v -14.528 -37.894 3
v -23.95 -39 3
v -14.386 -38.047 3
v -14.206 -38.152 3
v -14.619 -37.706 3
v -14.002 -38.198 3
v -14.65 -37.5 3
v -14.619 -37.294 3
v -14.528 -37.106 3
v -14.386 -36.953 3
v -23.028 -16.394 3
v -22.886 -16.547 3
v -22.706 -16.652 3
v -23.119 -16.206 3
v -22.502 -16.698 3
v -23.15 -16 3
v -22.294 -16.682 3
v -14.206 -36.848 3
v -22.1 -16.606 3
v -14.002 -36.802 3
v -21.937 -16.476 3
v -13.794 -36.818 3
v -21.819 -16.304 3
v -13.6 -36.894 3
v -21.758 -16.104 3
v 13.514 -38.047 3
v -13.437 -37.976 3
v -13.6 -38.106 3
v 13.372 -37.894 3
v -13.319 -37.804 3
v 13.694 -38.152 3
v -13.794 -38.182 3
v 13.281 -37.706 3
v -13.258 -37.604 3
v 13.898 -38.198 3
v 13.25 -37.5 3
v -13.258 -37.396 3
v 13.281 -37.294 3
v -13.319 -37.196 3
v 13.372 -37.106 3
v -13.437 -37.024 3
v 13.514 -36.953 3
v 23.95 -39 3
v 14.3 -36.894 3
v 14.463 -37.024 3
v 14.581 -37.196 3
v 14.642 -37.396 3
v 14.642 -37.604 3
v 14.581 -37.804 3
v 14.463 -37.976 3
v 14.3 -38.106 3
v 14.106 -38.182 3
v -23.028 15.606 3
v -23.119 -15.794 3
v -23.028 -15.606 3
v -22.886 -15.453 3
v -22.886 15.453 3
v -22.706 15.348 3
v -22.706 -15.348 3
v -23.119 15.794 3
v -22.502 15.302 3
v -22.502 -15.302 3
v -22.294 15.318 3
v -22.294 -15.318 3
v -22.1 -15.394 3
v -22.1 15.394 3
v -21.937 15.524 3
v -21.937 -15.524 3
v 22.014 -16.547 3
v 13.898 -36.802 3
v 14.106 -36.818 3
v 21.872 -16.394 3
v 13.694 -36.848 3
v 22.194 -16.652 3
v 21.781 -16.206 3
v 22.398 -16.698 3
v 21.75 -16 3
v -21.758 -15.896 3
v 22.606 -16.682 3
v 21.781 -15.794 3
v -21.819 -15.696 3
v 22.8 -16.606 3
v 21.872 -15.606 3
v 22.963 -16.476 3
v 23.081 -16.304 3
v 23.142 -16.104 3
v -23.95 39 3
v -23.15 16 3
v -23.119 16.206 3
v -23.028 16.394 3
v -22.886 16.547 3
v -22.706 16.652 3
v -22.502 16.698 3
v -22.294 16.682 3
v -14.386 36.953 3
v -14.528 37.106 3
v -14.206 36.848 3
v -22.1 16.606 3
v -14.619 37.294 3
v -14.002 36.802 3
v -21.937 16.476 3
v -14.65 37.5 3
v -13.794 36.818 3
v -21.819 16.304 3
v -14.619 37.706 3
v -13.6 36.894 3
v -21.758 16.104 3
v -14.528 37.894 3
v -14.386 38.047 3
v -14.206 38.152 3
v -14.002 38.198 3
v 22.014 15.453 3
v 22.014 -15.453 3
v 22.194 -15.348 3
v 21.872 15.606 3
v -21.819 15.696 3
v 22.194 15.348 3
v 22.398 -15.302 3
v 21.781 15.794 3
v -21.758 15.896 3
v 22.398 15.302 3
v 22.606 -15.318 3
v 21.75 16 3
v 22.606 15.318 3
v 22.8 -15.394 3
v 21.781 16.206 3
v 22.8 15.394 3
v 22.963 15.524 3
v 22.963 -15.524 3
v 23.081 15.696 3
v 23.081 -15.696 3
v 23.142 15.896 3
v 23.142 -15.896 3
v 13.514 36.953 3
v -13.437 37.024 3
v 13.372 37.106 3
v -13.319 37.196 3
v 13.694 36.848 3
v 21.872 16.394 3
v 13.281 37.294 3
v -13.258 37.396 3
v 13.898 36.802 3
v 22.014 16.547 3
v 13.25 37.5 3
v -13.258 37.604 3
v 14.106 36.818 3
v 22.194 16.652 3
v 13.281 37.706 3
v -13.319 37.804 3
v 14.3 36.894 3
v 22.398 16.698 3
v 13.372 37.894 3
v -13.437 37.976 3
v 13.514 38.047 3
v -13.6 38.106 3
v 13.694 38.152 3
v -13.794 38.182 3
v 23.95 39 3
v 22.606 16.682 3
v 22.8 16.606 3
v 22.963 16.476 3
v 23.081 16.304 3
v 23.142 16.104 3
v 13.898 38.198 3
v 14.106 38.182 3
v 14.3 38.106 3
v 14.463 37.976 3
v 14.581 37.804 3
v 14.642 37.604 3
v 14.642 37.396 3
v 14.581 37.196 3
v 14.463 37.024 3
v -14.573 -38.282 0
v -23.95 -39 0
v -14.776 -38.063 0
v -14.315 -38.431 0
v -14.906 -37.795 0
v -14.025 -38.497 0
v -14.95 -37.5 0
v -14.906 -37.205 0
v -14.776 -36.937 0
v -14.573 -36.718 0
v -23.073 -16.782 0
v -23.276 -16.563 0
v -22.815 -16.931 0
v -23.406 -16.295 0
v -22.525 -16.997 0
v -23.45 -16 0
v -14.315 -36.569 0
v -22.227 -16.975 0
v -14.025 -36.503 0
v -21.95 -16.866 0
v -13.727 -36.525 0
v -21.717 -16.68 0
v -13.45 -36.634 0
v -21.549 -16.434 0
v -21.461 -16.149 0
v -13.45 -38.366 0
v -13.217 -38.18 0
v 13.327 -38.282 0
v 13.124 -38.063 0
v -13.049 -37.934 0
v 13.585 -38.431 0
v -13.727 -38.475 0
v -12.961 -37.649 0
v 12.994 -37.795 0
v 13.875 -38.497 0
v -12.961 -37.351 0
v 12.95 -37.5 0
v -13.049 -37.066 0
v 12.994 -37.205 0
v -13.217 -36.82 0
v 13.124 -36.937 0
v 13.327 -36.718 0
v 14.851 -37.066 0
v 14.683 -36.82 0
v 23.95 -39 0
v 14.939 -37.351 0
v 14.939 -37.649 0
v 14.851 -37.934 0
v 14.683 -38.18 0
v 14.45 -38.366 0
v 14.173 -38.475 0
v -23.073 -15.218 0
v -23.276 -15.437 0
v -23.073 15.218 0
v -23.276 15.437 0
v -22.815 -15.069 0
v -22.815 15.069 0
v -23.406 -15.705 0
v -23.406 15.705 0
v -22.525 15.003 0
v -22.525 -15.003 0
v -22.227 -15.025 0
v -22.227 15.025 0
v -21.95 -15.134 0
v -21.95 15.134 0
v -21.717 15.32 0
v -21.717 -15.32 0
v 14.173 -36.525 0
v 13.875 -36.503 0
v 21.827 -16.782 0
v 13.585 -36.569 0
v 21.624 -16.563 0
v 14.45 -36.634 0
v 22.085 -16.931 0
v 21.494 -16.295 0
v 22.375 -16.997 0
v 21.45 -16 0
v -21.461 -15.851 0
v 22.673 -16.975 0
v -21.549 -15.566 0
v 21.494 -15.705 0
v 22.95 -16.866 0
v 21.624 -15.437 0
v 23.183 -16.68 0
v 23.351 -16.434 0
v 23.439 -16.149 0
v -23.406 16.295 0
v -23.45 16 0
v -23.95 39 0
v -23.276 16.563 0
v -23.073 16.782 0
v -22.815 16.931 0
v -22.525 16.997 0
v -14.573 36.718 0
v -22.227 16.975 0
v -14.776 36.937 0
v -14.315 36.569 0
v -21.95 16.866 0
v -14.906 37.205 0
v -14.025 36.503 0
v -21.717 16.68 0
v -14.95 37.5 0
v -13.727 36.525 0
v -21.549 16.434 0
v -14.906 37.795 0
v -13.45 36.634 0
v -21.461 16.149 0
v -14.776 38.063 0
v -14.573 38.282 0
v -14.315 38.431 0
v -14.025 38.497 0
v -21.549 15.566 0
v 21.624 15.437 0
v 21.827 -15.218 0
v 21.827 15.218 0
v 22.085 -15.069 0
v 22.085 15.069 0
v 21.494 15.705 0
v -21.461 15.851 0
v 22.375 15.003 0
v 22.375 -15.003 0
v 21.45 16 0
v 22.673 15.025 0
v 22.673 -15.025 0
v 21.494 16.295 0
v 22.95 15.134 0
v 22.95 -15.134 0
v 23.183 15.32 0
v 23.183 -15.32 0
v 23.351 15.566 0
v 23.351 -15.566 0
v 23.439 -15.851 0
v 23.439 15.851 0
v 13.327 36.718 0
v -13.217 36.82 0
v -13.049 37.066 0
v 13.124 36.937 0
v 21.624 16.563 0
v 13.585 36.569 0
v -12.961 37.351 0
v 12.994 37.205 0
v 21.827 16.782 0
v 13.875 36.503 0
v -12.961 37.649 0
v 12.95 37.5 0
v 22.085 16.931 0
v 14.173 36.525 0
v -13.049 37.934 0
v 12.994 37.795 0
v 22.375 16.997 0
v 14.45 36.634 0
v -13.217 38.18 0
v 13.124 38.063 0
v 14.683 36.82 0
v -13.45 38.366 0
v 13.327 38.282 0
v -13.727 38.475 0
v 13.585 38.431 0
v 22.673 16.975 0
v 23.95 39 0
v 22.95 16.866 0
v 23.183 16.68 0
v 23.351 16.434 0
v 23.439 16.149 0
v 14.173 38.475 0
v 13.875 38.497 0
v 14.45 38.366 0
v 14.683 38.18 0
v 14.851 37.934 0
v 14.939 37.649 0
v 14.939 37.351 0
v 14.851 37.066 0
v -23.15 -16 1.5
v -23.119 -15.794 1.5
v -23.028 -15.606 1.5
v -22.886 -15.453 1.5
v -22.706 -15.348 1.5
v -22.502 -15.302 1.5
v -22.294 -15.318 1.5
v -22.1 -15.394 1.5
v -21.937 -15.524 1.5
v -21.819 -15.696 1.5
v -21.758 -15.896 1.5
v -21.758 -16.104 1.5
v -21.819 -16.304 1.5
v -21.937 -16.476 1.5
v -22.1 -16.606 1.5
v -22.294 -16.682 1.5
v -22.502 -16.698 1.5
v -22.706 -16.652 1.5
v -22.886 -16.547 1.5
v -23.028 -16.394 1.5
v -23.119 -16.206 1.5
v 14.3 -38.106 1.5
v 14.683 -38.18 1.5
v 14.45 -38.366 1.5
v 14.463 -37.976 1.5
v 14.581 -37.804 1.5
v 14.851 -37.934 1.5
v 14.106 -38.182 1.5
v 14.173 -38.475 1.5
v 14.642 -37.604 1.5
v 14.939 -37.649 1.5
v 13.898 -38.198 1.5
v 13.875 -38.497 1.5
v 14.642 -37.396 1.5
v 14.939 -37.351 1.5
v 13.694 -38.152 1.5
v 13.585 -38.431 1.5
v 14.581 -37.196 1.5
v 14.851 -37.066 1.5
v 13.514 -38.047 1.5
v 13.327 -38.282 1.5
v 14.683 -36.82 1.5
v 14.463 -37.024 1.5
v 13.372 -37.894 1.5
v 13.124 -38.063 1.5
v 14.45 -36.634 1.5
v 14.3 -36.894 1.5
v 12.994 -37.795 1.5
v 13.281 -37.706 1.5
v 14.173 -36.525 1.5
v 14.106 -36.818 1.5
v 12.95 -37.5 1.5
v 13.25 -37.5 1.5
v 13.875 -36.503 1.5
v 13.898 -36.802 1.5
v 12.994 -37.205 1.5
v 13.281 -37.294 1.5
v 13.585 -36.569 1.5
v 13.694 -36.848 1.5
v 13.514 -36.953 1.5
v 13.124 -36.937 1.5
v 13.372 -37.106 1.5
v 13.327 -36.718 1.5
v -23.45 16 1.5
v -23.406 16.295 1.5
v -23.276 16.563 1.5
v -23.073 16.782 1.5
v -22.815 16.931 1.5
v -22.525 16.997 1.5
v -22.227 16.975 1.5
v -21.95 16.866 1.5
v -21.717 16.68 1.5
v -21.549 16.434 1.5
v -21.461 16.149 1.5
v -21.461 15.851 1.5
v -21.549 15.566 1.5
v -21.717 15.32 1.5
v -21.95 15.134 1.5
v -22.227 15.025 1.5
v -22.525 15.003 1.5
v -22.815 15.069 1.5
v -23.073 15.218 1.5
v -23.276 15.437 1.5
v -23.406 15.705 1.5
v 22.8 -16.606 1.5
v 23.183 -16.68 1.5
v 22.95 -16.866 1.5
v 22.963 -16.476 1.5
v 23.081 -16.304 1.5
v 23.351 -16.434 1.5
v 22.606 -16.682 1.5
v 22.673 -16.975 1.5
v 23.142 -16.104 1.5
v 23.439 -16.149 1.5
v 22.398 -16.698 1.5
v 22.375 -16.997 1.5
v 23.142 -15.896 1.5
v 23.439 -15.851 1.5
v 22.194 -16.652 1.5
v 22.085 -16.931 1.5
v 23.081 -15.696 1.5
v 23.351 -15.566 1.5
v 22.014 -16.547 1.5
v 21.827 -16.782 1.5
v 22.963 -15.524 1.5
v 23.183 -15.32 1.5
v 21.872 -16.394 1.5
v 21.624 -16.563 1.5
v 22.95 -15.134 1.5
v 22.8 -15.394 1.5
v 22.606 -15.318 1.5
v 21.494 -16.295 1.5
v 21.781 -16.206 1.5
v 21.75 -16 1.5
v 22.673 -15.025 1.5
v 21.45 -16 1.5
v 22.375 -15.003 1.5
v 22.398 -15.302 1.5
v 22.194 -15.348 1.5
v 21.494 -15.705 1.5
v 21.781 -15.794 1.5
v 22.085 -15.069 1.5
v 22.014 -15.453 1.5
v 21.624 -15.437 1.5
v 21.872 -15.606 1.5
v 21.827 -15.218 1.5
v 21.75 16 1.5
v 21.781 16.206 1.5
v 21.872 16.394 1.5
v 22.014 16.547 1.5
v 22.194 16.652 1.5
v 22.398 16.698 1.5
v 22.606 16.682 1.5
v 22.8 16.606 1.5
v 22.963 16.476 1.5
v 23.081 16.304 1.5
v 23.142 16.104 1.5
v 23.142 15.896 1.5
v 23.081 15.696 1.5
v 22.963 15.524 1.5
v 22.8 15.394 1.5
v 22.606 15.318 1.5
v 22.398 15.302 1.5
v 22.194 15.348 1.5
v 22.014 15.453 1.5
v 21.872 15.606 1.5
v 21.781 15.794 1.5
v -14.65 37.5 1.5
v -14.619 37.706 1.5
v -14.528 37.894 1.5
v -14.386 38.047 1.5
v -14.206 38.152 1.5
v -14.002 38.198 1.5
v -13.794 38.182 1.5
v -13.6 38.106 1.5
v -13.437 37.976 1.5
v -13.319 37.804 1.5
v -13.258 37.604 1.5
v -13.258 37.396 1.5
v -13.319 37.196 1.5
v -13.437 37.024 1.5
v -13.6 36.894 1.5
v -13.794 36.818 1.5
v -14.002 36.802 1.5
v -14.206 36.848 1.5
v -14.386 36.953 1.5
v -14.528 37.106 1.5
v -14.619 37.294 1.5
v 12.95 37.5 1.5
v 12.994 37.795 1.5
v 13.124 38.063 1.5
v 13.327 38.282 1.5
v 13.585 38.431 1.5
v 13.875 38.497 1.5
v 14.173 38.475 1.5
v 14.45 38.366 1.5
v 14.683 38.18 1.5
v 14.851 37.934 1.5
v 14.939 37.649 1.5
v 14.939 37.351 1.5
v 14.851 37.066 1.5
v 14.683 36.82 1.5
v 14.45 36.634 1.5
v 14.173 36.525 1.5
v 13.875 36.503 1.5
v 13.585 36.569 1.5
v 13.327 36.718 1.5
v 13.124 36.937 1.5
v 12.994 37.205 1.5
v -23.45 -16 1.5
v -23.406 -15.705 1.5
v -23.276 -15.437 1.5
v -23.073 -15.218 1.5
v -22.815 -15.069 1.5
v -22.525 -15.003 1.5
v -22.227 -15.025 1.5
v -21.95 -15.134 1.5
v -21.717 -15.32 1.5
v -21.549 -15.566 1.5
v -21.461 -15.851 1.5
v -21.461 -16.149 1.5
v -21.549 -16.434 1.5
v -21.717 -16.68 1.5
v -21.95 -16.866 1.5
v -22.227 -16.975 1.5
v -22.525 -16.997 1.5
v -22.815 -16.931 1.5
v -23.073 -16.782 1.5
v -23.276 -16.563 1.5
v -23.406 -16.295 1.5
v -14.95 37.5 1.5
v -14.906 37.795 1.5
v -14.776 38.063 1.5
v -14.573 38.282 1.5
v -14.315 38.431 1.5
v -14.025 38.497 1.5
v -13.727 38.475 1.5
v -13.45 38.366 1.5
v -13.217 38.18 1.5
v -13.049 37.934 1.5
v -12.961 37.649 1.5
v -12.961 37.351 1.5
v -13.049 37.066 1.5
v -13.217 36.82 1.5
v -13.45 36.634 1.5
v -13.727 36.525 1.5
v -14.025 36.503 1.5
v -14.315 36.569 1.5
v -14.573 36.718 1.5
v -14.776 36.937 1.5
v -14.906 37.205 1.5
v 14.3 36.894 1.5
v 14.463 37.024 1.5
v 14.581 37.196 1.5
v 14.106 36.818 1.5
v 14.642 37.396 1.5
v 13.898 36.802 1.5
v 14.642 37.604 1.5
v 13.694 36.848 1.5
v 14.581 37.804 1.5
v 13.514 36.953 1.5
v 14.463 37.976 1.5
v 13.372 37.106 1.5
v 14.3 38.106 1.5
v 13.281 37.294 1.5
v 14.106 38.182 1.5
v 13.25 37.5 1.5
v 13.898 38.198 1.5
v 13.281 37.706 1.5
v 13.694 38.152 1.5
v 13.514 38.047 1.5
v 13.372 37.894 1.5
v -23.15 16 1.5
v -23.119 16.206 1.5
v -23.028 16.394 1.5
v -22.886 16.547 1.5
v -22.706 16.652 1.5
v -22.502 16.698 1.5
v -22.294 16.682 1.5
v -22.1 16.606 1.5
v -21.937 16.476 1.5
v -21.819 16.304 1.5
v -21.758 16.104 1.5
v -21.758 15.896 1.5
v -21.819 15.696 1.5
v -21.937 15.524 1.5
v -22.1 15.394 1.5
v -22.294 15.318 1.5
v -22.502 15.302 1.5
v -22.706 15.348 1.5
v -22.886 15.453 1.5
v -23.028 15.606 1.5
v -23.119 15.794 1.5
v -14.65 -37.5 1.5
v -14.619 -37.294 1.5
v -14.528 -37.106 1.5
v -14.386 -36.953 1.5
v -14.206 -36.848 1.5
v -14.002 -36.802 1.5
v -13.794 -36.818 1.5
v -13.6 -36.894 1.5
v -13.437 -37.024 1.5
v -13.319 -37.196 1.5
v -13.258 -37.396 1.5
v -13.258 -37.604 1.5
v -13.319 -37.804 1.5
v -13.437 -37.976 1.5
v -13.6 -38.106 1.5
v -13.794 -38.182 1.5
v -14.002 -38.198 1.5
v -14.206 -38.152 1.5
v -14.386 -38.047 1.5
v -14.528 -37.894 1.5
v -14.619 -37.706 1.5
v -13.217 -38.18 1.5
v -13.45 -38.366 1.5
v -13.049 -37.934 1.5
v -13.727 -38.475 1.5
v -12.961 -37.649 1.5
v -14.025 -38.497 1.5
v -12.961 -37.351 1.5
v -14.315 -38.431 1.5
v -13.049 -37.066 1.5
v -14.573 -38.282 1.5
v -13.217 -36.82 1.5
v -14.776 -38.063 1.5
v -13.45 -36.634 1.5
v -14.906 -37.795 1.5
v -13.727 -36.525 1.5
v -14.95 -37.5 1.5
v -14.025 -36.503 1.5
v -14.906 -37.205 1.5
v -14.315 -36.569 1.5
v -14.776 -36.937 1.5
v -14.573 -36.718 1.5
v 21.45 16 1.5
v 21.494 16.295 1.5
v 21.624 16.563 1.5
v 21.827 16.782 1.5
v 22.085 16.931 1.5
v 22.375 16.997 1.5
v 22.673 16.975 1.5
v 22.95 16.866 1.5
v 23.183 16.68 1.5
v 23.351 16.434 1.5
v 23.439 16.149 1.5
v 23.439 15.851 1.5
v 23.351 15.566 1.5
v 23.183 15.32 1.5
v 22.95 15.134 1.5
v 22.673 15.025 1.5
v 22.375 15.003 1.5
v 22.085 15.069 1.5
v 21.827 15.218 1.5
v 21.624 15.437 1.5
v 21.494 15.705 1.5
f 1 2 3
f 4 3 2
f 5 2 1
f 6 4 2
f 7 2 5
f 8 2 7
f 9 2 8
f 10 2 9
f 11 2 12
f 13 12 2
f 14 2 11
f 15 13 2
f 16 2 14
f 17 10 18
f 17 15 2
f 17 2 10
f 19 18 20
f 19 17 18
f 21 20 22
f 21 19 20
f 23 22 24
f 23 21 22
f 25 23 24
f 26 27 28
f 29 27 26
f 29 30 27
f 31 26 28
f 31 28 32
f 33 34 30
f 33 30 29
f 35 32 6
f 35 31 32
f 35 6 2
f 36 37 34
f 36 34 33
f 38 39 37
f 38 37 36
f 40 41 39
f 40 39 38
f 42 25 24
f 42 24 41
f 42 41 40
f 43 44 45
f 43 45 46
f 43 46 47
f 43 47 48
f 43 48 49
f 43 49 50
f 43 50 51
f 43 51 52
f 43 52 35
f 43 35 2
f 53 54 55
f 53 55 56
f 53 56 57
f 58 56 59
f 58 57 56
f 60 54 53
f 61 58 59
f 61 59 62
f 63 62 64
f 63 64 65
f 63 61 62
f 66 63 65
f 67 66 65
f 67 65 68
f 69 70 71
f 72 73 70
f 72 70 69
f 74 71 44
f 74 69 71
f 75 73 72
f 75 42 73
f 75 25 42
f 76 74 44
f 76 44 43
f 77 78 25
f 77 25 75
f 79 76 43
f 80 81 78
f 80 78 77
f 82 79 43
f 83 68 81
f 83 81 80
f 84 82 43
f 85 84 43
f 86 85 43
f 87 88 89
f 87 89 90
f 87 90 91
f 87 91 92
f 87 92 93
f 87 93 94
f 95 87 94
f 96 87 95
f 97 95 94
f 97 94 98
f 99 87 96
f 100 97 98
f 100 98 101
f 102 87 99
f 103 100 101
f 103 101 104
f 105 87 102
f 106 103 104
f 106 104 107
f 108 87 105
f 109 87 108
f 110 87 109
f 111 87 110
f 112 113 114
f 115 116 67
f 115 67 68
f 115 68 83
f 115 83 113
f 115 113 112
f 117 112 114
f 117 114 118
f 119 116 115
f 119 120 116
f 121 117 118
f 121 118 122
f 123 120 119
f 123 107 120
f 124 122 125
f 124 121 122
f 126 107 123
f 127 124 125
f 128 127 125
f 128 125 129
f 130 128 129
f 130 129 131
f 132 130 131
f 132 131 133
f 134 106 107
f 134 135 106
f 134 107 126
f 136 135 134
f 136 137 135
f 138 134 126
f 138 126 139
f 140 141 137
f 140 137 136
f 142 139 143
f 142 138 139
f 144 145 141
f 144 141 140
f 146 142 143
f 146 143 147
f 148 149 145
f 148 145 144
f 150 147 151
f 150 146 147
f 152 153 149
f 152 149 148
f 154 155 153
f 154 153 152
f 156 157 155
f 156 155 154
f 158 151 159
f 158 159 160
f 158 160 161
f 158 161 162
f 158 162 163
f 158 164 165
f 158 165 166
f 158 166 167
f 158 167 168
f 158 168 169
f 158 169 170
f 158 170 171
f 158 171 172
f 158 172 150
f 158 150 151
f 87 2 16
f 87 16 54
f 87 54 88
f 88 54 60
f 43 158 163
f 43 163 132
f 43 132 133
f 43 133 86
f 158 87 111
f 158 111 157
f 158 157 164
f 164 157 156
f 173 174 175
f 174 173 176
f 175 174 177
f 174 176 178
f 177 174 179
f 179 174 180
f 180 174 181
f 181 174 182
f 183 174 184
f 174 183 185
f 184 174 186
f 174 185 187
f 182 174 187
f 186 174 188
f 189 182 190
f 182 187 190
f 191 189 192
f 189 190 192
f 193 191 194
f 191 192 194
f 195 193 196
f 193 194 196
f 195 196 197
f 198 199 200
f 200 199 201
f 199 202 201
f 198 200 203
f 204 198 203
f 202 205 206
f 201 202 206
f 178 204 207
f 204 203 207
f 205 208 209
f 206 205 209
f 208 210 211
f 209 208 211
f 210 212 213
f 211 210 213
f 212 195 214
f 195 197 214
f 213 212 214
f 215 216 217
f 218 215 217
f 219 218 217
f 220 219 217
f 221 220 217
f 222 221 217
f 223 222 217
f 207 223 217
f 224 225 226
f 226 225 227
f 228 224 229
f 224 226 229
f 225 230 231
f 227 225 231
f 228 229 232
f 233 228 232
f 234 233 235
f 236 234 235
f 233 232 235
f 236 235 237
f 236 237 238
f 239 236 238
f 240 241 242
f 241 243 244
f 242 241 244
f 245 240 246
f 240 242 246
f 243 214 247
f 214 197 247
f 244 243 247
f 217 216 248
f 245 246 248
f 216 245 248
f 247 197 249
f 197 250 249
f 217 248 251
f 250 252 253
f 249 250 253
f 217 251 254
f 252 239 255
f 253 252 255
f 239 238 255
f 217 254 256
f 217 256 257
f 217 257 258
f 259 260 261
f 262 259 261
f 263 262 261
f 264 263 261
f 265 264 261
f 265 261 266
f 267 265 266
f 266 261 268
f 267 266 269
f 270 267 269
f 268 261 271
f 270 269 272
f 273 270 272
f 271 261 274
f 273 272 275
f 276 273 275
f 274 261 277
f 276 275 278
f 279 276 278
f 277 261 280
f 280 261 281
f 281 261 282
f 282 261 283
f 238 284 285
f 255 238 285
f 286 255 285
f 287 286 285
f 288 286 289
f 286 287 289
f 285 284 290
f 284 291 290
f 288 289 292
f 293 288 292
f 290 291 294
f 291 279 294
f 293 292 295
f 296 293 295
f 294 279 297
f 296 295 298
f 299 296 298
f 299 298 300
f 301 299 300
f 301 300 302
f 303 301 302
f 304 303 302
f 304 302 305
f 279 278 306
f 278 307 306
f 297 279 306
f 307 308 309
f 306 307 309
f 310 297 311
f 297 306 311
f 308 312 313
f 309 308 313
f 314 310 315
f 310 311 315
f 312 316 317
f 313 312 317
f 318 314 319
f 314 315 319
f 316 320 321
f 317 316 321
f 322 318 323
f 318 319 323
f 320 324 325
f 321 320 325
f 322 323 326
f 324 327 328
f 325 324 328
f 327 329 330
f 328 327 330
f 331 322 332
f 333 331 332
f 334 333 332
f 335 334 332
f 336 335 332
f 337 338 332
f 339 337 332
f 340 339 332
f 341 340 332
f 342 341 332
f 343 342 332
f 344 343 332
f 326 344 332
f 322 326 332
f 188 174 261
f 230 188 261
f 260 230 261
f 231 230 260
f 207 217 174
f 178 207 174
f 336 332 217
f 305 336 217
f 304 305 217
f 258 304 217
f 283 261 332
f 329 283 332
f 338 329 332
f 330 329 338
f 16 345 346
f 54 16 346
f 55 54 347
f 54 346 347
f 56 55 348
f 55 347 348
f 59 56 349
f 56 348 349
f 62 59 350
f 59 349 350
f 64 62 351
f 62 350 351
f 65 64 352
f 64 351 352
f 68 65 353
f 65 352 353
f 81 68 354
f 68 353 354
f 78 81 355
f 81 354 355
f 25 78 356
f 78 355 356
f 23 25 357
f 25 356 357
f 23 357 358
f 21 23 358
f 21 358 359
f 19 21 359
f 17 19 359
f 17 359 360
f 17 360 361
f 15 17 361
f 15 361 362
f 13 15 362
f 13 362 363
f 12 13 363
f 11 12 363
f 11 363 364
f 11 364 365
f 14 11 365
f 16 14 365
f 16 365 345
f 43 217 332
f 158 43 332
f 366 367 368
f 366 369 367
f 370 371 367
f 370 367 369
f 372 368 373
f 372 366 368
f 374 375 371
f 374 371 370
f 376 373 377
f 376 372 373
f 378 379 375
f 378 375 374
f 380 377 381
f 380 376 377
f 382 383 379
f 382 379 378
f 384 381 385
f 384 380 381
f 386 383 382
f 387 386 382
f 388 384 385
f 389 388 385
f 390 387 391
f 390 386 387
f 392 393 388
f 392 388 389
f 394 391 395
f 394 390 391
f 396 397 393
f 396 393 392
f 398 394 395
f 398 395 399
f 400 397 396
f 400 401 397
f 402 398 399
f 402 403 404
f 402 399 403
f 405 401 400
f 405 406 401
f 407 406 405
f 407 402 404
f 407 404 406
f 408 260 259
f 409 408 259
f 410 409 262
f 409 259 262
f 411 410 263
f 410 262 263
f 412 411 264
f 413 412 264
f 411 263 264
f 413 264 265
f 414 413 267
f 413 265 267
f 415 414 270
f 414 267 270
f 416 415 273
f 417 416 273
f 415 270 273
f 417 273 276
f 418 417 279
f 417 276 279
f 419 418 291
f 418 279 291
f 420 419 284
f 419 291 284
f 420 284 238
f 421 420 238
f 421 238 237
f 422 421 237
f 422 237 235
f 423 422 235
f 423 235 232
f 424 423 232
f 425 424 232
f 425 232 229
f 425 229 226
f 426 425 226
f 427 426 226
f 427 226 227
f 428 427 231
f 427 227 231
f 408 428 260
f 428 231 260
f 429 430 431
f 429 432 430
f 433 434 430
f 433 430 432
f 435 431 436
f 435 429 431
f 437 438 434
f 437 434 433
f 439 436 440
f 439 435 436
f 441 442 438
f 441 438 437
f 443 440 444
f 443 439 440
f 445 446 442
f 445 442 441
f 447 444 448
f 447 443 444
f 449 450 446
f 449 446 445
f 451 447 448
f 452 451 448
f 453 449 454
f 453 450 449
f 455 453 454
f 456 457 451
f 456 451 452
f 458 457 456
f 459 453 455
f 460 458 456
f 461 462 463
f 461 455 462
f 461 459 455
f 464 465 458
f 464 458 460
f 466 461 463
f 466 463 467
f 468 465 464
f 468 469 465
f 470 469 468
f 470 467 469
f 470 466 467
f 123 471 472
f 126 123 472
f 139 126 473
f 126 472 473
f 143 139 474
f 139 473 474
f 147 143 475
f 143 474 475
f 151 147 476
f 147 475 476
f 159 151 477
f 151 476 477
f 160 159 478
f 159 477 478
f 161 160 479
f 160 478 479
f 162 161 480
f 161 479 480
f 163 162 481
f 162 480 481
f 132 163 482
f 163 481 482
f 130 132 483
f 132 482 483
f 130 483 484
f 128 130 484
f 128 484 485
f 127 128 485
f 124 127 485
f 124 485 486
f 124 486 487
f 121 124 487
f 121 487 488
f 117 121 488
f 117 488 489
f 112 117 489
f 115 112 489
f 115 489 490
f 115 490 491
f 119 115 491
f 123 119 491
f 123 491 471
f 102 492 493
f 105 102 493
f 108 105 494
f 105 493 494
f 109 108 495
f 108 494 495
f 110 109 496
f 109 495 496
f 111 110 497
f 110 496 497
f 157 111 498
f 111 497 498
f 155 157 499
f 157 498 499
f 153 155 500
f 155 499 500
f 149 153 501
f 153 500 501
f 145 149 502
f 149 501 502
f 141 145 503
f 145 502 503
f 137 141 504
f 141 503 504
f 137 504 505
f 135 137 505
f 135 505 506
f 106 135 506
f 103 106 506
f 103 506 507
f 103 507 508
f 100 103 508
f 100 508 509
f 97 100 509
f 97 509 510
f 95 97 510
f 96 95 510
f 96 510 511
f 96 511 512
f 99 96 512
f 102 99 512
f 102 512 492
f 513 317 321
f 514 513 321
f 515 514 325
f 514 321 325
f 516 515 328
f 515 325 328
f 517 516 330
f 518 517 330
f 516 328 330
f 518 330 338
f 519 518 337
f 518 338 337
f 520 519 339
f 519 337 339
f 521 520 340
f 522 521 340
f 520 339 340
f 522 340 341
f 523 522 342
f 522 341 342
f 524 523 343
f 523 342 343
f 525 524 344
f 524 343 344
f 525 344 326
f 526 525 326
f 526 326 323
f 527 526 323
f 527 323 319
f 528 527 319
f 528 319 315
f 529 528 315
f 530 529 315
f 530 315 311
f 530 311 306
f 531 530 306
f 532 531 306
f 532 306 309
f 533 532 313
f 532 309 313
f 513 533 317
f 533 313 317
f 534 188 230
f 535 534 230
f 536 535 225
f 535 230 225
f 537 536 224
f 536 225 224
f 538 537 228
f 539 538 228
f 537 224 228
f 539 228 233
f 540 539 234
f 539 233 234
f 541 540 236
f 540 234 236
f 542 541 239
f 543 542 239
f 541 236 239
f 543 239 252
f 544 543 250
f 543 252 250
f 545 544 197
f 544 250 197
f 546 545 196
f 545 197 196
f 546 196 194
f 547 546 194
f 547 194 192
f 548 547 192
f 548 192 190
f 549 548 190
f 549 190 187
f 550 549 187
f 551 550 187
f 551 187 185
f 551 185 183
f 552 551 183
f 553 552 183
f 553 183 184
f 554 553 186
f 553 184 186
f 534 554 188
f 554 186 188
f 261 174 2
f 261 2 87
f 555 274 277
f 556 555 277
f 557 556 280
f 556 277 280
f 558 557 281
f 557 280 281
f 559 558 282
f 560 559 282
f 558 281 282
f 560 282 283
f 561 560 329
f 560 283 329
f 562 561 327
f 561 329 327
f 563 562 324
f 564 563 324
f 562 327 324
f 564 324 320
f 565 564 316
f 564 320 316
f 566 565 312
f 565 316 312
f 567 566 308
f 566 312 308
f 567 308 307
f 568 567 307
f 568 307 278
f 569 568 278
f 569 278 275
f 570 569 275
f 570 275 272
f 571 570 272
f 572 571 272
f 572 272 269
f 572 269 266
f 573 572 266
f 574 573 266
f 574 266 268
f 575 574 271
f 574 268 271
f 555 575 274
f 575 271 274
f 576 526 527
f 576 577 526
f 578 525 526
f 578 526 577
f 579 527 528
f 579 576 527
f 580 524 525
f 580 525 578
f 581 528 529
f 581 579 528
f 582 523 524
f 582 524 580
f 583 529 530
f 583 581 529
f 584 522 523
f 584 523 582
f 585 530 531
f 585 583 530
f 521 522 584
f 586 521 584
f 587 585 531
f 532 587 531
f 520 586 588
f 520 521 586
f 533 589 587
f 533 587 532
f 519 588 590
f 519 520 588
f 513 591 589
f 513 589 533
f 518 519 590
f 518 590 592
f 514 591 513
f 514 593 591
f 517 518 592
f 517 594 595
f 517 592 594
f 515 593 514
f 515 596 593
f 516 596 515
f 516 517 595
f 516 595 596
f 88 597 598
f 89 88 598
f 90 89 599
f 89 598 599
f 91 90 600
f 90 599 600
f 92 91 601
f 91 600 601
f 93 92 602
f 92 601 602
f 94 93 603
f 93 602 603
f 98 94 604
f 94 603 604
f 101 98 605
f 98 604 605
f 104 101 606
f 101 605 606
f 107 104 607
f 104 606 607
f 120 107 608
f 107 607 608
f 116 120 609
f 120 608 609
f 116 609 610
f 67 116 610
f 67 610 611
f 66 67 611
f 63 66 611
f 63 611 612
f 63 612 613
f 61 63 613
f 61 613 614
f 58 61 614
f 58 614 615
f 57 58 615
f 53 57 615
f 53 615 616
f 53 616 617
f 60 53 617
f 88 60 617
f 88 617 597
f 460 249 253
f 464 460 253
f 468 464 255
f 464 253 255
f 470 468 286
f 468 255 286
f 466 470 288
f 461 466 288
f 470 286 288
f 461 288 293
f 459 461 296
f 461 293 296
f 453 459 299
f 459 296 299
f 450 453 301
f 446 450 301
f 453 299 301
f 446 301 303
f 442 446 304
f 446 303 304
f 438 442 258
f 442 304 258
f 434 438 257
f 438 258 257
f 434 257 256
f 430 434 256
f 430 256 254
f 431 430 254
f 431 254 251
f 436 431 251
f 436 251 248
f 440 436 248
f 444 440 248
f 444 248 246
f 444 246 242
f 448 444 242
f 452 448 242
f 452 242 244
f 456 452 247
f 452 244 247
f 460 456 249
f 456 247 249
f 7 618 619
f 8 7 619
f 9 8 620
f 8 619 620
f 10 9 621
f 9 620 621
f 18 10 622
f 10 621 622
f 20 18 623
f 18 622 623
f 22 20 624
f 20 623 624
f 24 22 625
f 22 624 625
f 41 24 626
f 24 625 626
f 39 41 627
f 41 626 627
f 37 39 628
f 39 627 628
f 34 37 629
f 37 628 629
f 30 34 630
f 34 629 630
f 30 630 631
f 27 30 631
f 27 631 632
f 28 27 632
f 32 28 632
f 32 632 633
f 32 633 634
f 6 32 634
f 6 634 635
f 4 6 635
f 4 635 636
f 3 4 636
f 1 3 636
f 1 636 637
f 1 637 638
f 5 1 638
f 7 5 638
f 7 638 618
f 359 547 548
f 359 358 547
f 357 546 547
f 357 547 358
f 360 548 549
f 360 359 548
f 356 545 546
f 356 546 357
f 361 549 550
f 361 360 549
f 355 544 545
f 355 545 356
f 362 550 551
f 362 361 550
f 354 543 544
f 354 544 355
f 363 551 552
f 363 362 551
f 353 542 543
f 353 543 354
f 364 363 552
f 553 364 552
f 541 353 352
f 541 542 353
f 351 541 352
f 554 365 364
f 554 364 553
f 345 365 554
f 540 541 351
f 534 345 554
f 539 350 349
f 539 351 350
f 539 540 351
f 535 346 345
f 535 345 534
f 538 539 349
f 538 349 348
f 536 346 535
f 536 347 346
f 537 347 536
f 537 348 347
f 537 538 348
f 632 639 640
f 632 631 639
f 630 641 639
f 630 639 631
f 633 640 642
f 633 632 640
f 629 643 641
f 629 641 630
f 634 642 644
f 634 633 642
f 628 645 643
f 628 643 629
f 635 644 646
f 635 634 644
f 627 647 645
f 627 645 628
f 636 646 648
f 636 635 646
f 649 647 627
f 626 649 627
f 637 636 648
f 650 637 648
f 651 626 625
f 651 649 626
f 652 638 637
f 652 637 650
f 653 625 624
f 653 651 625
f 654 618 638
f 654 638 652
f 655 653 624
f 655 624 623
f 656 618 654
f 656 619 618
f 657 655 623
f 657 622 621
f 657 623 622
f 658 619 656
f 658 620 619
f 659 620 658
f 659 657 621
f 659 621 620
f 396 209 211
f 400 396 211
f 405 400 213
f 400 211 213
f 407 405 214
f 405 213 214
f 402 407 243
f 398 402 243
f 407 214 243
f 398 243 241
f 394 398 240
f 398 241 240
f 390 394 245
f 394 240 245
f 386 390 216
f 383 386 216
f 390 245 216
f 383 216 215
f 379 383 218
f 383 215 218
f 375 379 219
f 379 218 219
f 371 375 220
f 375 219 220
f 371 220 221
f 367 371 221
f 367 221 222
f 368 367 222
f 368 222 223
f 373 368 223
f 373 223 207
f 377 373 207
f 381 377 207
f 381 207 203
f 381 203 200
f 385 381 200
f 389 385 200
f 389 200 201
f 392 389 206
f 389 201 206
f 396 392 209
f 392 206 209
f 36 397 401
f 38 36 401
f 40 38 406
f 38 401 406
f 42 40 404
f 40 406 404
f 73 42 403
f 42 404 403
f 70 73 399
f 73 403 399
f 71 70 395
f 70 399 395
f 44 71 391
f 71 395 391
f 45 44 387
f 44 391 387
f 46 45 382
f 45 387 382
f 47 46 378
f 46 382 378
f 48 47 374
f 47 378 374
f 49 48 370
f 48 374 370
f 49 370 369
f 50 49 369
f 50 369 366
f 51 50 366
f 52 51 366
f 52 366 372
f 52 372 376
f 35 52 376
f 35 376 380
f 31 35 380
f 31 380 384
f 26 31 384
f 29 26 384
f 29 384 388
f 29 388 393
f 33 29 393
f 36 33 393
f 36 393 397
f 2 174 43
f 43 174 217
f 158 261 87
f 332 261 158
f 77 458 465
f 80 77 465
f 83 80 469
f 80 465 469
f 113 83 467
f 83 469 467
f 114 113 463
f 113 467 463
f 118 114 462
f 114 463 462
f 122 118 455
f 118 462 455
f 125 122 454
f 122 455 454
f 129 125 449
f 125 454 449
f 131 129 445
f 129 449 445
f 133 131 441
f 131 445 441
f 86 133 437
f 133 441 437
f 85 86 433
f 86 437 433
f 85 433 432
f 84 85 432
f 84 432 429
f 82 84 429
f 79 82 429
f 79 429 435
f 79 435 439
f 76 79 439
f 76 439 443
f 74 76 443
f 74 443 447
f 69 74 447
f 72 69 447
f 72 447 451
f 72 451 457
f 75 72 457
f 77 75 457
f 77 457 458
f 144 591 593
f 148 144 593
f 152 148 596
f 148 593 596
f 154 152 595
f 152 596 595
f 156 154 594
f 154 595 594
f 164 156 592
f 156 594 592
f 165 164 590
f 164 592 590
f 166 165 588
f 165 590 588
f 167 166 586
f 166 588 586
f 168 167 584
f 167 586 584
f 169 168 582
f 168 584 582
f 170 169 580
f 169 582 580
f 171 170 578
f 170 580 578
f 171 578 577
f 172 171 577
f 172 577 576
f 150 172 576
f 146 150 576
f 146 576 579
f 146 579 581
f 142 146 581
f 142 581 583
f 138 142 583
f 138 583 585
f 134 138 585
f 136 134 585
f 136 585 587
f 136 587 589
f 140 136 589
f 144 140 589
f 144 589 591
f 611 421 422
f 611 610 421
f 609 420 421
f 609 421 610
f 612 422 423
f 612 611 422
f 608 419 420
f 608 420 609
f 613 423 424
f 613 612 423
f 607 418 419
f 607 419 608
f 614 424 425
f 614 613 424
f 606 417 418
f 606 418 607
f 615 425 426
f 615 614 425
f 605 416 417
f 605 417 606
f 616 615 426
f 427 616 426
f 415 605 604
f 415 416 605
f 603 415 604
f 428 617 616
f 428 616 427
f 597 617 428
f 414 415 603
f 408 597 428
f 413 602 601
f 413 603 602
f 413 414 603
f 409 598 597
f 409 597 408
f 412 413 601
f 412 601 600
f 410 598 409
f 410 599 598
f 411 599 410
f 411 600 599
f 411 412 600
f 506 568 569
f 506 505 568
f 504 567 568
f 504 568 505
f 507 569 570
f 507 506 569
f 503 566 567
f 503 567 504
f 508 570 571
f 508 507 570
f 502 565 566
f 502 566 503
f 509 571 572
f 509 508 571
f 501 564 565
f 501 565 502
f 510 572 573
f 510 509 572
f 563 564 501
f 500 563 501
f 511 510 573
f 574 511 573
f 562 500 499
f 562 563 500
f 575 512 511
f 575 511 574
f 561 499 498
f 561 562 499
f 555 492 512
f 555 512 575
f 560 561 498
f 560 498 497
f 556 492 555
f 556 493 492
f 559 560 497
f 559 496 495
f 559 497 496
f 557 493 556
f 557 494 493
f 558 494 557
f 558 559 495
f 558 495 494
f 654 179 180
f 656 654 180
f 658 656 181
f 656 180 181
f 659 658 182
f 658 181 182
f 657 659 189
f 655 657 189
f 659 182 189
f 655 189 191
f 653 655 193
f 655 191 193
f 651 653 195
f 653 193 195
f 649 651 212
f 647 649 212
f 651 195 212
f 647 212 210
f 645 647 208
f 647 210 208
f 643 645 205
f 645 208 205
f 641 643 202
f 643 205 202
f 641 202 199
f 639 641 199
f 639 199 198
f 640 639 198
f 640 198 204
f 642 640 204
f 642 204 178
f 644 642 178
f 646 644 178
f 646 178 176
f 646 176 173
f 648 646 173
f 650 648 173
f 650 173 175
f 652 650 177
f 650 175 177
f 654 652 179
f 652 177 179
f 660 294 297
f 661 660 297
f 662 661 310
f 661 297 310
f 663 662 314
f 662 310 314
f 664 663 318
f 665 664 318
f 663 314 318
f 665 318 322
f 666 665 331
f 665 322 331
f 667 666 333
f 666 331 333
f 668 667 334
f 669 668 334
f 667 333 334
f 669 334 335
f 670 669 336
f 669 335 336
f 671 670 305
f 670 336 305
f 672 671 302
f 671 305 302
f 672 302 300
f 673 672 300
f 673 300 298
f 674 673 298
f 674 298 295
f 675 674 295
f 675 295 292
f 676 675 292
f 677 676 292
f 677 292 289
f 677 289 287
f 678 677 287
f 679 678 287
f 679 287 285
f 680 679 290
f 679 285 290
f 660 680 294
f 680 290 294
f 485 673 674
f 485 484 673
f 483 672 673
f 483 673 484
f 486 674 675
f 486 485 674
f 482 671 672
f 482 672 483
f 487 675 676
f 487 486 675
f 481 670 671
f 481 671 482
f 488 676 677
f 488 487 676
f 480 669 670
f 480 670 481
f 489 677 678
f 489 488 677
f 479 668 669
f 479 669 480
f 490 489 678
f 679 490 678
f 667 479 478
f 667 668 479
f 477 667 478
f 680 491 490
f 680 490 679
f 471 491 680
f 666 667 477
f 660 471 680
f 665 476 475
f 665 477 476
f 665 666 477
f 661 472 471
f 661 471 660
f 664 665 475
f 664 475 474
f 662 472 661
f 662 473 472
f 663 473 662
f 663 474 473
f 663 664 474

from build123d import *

# Parameters (mm, degrees)
SKETCH_1_W          = 47.9
SKETCH_1_H          = 78
EXTRUDE_1_DEPTH     = 3
SKETCH_2_R          = 0.7
CUT_EXTRUDE_1_DEPTH = 46.865046604
SKETCH_2_3_R        = 1
CUT_EXTRUDE_2_DEPTH = 1.5


with BuildPart() as part:
    # 草图1 → 凸台-拉伸1 (new body)
    with BuildSketch(Plane.XY):
        Rectangle(SKETCH_1_W, SKETCH_1_H)
    extrude(amount=EXTRUDE_1_DEPTH)

    # 草图2 → 切除-拉伸1 (cut, through all)
    with BuildSketch(Plane(origin=(0, 0, 0), x_dir=(-1, 0, 0), z_dir=(0, 0, -1))):
        with Locations((-13.95, 37.5)):
            Circle(SKETCH_2_R)
        with Locations((13.95, 37.5)):
            Circle(SKETCH_2_R)
        with Locations((-13.95, -37.5)):
            Circle(SKETCH_2_R)
        with Locations((13.95, -37.5)):
            Circle(SKETCH_2_R)
        with Locations((-22.45, 16)):
            Circle(SKETCH_2_R)
        with Locations((-22.45, -16)):
            Circle(SKETCH_2_R)
        with Locations((22.45, 16)):
            Circle(SKETCH_2_R)
        with Locations((22.45, -16)):
            Circle(SKETCH_2_R)
    extrude(amount=-CUT_EXTRUDE_1_DEPTH, mode=Mode.SUBTRACT)

    # 草图2<3> → 切除-拉伸2 (cut)
    with BuildSketch(Plane(origin=(0, 0, 0), x_dir=(-1, 0, 0), z_dir=(0, 0, -1))):
        with Locations((-13.95, 37.5)):
            Circle(SKETCH_2_3_R)
        with Locations((13.95, 37.5)):
            Circle(SKETCH_2_3_R)
        with Locations((-13.95, -37.5)):
            Circle(SKETCH_2_3_R)
        with Locations((13.95, -37.5)):
            Circle(SKETCH_2_3_R)
        with Locations((-22.45, 16)):
            Circle(SKETCH_2_3_R)
        with Locations((22.45, 16)):
            Circle(SKETCH_2_3_R)
        with Locations((-22.45, -16)):
            Circle(SKETCH_2_3_R)
        with Locations((22.45, -16)):
            Circle(SKETCH_2_3_R)
    extrude(amount=-CUT_EXTRUDE_2_DEPTH, mode=Mode.SUBTRACT)


solid = part.part
